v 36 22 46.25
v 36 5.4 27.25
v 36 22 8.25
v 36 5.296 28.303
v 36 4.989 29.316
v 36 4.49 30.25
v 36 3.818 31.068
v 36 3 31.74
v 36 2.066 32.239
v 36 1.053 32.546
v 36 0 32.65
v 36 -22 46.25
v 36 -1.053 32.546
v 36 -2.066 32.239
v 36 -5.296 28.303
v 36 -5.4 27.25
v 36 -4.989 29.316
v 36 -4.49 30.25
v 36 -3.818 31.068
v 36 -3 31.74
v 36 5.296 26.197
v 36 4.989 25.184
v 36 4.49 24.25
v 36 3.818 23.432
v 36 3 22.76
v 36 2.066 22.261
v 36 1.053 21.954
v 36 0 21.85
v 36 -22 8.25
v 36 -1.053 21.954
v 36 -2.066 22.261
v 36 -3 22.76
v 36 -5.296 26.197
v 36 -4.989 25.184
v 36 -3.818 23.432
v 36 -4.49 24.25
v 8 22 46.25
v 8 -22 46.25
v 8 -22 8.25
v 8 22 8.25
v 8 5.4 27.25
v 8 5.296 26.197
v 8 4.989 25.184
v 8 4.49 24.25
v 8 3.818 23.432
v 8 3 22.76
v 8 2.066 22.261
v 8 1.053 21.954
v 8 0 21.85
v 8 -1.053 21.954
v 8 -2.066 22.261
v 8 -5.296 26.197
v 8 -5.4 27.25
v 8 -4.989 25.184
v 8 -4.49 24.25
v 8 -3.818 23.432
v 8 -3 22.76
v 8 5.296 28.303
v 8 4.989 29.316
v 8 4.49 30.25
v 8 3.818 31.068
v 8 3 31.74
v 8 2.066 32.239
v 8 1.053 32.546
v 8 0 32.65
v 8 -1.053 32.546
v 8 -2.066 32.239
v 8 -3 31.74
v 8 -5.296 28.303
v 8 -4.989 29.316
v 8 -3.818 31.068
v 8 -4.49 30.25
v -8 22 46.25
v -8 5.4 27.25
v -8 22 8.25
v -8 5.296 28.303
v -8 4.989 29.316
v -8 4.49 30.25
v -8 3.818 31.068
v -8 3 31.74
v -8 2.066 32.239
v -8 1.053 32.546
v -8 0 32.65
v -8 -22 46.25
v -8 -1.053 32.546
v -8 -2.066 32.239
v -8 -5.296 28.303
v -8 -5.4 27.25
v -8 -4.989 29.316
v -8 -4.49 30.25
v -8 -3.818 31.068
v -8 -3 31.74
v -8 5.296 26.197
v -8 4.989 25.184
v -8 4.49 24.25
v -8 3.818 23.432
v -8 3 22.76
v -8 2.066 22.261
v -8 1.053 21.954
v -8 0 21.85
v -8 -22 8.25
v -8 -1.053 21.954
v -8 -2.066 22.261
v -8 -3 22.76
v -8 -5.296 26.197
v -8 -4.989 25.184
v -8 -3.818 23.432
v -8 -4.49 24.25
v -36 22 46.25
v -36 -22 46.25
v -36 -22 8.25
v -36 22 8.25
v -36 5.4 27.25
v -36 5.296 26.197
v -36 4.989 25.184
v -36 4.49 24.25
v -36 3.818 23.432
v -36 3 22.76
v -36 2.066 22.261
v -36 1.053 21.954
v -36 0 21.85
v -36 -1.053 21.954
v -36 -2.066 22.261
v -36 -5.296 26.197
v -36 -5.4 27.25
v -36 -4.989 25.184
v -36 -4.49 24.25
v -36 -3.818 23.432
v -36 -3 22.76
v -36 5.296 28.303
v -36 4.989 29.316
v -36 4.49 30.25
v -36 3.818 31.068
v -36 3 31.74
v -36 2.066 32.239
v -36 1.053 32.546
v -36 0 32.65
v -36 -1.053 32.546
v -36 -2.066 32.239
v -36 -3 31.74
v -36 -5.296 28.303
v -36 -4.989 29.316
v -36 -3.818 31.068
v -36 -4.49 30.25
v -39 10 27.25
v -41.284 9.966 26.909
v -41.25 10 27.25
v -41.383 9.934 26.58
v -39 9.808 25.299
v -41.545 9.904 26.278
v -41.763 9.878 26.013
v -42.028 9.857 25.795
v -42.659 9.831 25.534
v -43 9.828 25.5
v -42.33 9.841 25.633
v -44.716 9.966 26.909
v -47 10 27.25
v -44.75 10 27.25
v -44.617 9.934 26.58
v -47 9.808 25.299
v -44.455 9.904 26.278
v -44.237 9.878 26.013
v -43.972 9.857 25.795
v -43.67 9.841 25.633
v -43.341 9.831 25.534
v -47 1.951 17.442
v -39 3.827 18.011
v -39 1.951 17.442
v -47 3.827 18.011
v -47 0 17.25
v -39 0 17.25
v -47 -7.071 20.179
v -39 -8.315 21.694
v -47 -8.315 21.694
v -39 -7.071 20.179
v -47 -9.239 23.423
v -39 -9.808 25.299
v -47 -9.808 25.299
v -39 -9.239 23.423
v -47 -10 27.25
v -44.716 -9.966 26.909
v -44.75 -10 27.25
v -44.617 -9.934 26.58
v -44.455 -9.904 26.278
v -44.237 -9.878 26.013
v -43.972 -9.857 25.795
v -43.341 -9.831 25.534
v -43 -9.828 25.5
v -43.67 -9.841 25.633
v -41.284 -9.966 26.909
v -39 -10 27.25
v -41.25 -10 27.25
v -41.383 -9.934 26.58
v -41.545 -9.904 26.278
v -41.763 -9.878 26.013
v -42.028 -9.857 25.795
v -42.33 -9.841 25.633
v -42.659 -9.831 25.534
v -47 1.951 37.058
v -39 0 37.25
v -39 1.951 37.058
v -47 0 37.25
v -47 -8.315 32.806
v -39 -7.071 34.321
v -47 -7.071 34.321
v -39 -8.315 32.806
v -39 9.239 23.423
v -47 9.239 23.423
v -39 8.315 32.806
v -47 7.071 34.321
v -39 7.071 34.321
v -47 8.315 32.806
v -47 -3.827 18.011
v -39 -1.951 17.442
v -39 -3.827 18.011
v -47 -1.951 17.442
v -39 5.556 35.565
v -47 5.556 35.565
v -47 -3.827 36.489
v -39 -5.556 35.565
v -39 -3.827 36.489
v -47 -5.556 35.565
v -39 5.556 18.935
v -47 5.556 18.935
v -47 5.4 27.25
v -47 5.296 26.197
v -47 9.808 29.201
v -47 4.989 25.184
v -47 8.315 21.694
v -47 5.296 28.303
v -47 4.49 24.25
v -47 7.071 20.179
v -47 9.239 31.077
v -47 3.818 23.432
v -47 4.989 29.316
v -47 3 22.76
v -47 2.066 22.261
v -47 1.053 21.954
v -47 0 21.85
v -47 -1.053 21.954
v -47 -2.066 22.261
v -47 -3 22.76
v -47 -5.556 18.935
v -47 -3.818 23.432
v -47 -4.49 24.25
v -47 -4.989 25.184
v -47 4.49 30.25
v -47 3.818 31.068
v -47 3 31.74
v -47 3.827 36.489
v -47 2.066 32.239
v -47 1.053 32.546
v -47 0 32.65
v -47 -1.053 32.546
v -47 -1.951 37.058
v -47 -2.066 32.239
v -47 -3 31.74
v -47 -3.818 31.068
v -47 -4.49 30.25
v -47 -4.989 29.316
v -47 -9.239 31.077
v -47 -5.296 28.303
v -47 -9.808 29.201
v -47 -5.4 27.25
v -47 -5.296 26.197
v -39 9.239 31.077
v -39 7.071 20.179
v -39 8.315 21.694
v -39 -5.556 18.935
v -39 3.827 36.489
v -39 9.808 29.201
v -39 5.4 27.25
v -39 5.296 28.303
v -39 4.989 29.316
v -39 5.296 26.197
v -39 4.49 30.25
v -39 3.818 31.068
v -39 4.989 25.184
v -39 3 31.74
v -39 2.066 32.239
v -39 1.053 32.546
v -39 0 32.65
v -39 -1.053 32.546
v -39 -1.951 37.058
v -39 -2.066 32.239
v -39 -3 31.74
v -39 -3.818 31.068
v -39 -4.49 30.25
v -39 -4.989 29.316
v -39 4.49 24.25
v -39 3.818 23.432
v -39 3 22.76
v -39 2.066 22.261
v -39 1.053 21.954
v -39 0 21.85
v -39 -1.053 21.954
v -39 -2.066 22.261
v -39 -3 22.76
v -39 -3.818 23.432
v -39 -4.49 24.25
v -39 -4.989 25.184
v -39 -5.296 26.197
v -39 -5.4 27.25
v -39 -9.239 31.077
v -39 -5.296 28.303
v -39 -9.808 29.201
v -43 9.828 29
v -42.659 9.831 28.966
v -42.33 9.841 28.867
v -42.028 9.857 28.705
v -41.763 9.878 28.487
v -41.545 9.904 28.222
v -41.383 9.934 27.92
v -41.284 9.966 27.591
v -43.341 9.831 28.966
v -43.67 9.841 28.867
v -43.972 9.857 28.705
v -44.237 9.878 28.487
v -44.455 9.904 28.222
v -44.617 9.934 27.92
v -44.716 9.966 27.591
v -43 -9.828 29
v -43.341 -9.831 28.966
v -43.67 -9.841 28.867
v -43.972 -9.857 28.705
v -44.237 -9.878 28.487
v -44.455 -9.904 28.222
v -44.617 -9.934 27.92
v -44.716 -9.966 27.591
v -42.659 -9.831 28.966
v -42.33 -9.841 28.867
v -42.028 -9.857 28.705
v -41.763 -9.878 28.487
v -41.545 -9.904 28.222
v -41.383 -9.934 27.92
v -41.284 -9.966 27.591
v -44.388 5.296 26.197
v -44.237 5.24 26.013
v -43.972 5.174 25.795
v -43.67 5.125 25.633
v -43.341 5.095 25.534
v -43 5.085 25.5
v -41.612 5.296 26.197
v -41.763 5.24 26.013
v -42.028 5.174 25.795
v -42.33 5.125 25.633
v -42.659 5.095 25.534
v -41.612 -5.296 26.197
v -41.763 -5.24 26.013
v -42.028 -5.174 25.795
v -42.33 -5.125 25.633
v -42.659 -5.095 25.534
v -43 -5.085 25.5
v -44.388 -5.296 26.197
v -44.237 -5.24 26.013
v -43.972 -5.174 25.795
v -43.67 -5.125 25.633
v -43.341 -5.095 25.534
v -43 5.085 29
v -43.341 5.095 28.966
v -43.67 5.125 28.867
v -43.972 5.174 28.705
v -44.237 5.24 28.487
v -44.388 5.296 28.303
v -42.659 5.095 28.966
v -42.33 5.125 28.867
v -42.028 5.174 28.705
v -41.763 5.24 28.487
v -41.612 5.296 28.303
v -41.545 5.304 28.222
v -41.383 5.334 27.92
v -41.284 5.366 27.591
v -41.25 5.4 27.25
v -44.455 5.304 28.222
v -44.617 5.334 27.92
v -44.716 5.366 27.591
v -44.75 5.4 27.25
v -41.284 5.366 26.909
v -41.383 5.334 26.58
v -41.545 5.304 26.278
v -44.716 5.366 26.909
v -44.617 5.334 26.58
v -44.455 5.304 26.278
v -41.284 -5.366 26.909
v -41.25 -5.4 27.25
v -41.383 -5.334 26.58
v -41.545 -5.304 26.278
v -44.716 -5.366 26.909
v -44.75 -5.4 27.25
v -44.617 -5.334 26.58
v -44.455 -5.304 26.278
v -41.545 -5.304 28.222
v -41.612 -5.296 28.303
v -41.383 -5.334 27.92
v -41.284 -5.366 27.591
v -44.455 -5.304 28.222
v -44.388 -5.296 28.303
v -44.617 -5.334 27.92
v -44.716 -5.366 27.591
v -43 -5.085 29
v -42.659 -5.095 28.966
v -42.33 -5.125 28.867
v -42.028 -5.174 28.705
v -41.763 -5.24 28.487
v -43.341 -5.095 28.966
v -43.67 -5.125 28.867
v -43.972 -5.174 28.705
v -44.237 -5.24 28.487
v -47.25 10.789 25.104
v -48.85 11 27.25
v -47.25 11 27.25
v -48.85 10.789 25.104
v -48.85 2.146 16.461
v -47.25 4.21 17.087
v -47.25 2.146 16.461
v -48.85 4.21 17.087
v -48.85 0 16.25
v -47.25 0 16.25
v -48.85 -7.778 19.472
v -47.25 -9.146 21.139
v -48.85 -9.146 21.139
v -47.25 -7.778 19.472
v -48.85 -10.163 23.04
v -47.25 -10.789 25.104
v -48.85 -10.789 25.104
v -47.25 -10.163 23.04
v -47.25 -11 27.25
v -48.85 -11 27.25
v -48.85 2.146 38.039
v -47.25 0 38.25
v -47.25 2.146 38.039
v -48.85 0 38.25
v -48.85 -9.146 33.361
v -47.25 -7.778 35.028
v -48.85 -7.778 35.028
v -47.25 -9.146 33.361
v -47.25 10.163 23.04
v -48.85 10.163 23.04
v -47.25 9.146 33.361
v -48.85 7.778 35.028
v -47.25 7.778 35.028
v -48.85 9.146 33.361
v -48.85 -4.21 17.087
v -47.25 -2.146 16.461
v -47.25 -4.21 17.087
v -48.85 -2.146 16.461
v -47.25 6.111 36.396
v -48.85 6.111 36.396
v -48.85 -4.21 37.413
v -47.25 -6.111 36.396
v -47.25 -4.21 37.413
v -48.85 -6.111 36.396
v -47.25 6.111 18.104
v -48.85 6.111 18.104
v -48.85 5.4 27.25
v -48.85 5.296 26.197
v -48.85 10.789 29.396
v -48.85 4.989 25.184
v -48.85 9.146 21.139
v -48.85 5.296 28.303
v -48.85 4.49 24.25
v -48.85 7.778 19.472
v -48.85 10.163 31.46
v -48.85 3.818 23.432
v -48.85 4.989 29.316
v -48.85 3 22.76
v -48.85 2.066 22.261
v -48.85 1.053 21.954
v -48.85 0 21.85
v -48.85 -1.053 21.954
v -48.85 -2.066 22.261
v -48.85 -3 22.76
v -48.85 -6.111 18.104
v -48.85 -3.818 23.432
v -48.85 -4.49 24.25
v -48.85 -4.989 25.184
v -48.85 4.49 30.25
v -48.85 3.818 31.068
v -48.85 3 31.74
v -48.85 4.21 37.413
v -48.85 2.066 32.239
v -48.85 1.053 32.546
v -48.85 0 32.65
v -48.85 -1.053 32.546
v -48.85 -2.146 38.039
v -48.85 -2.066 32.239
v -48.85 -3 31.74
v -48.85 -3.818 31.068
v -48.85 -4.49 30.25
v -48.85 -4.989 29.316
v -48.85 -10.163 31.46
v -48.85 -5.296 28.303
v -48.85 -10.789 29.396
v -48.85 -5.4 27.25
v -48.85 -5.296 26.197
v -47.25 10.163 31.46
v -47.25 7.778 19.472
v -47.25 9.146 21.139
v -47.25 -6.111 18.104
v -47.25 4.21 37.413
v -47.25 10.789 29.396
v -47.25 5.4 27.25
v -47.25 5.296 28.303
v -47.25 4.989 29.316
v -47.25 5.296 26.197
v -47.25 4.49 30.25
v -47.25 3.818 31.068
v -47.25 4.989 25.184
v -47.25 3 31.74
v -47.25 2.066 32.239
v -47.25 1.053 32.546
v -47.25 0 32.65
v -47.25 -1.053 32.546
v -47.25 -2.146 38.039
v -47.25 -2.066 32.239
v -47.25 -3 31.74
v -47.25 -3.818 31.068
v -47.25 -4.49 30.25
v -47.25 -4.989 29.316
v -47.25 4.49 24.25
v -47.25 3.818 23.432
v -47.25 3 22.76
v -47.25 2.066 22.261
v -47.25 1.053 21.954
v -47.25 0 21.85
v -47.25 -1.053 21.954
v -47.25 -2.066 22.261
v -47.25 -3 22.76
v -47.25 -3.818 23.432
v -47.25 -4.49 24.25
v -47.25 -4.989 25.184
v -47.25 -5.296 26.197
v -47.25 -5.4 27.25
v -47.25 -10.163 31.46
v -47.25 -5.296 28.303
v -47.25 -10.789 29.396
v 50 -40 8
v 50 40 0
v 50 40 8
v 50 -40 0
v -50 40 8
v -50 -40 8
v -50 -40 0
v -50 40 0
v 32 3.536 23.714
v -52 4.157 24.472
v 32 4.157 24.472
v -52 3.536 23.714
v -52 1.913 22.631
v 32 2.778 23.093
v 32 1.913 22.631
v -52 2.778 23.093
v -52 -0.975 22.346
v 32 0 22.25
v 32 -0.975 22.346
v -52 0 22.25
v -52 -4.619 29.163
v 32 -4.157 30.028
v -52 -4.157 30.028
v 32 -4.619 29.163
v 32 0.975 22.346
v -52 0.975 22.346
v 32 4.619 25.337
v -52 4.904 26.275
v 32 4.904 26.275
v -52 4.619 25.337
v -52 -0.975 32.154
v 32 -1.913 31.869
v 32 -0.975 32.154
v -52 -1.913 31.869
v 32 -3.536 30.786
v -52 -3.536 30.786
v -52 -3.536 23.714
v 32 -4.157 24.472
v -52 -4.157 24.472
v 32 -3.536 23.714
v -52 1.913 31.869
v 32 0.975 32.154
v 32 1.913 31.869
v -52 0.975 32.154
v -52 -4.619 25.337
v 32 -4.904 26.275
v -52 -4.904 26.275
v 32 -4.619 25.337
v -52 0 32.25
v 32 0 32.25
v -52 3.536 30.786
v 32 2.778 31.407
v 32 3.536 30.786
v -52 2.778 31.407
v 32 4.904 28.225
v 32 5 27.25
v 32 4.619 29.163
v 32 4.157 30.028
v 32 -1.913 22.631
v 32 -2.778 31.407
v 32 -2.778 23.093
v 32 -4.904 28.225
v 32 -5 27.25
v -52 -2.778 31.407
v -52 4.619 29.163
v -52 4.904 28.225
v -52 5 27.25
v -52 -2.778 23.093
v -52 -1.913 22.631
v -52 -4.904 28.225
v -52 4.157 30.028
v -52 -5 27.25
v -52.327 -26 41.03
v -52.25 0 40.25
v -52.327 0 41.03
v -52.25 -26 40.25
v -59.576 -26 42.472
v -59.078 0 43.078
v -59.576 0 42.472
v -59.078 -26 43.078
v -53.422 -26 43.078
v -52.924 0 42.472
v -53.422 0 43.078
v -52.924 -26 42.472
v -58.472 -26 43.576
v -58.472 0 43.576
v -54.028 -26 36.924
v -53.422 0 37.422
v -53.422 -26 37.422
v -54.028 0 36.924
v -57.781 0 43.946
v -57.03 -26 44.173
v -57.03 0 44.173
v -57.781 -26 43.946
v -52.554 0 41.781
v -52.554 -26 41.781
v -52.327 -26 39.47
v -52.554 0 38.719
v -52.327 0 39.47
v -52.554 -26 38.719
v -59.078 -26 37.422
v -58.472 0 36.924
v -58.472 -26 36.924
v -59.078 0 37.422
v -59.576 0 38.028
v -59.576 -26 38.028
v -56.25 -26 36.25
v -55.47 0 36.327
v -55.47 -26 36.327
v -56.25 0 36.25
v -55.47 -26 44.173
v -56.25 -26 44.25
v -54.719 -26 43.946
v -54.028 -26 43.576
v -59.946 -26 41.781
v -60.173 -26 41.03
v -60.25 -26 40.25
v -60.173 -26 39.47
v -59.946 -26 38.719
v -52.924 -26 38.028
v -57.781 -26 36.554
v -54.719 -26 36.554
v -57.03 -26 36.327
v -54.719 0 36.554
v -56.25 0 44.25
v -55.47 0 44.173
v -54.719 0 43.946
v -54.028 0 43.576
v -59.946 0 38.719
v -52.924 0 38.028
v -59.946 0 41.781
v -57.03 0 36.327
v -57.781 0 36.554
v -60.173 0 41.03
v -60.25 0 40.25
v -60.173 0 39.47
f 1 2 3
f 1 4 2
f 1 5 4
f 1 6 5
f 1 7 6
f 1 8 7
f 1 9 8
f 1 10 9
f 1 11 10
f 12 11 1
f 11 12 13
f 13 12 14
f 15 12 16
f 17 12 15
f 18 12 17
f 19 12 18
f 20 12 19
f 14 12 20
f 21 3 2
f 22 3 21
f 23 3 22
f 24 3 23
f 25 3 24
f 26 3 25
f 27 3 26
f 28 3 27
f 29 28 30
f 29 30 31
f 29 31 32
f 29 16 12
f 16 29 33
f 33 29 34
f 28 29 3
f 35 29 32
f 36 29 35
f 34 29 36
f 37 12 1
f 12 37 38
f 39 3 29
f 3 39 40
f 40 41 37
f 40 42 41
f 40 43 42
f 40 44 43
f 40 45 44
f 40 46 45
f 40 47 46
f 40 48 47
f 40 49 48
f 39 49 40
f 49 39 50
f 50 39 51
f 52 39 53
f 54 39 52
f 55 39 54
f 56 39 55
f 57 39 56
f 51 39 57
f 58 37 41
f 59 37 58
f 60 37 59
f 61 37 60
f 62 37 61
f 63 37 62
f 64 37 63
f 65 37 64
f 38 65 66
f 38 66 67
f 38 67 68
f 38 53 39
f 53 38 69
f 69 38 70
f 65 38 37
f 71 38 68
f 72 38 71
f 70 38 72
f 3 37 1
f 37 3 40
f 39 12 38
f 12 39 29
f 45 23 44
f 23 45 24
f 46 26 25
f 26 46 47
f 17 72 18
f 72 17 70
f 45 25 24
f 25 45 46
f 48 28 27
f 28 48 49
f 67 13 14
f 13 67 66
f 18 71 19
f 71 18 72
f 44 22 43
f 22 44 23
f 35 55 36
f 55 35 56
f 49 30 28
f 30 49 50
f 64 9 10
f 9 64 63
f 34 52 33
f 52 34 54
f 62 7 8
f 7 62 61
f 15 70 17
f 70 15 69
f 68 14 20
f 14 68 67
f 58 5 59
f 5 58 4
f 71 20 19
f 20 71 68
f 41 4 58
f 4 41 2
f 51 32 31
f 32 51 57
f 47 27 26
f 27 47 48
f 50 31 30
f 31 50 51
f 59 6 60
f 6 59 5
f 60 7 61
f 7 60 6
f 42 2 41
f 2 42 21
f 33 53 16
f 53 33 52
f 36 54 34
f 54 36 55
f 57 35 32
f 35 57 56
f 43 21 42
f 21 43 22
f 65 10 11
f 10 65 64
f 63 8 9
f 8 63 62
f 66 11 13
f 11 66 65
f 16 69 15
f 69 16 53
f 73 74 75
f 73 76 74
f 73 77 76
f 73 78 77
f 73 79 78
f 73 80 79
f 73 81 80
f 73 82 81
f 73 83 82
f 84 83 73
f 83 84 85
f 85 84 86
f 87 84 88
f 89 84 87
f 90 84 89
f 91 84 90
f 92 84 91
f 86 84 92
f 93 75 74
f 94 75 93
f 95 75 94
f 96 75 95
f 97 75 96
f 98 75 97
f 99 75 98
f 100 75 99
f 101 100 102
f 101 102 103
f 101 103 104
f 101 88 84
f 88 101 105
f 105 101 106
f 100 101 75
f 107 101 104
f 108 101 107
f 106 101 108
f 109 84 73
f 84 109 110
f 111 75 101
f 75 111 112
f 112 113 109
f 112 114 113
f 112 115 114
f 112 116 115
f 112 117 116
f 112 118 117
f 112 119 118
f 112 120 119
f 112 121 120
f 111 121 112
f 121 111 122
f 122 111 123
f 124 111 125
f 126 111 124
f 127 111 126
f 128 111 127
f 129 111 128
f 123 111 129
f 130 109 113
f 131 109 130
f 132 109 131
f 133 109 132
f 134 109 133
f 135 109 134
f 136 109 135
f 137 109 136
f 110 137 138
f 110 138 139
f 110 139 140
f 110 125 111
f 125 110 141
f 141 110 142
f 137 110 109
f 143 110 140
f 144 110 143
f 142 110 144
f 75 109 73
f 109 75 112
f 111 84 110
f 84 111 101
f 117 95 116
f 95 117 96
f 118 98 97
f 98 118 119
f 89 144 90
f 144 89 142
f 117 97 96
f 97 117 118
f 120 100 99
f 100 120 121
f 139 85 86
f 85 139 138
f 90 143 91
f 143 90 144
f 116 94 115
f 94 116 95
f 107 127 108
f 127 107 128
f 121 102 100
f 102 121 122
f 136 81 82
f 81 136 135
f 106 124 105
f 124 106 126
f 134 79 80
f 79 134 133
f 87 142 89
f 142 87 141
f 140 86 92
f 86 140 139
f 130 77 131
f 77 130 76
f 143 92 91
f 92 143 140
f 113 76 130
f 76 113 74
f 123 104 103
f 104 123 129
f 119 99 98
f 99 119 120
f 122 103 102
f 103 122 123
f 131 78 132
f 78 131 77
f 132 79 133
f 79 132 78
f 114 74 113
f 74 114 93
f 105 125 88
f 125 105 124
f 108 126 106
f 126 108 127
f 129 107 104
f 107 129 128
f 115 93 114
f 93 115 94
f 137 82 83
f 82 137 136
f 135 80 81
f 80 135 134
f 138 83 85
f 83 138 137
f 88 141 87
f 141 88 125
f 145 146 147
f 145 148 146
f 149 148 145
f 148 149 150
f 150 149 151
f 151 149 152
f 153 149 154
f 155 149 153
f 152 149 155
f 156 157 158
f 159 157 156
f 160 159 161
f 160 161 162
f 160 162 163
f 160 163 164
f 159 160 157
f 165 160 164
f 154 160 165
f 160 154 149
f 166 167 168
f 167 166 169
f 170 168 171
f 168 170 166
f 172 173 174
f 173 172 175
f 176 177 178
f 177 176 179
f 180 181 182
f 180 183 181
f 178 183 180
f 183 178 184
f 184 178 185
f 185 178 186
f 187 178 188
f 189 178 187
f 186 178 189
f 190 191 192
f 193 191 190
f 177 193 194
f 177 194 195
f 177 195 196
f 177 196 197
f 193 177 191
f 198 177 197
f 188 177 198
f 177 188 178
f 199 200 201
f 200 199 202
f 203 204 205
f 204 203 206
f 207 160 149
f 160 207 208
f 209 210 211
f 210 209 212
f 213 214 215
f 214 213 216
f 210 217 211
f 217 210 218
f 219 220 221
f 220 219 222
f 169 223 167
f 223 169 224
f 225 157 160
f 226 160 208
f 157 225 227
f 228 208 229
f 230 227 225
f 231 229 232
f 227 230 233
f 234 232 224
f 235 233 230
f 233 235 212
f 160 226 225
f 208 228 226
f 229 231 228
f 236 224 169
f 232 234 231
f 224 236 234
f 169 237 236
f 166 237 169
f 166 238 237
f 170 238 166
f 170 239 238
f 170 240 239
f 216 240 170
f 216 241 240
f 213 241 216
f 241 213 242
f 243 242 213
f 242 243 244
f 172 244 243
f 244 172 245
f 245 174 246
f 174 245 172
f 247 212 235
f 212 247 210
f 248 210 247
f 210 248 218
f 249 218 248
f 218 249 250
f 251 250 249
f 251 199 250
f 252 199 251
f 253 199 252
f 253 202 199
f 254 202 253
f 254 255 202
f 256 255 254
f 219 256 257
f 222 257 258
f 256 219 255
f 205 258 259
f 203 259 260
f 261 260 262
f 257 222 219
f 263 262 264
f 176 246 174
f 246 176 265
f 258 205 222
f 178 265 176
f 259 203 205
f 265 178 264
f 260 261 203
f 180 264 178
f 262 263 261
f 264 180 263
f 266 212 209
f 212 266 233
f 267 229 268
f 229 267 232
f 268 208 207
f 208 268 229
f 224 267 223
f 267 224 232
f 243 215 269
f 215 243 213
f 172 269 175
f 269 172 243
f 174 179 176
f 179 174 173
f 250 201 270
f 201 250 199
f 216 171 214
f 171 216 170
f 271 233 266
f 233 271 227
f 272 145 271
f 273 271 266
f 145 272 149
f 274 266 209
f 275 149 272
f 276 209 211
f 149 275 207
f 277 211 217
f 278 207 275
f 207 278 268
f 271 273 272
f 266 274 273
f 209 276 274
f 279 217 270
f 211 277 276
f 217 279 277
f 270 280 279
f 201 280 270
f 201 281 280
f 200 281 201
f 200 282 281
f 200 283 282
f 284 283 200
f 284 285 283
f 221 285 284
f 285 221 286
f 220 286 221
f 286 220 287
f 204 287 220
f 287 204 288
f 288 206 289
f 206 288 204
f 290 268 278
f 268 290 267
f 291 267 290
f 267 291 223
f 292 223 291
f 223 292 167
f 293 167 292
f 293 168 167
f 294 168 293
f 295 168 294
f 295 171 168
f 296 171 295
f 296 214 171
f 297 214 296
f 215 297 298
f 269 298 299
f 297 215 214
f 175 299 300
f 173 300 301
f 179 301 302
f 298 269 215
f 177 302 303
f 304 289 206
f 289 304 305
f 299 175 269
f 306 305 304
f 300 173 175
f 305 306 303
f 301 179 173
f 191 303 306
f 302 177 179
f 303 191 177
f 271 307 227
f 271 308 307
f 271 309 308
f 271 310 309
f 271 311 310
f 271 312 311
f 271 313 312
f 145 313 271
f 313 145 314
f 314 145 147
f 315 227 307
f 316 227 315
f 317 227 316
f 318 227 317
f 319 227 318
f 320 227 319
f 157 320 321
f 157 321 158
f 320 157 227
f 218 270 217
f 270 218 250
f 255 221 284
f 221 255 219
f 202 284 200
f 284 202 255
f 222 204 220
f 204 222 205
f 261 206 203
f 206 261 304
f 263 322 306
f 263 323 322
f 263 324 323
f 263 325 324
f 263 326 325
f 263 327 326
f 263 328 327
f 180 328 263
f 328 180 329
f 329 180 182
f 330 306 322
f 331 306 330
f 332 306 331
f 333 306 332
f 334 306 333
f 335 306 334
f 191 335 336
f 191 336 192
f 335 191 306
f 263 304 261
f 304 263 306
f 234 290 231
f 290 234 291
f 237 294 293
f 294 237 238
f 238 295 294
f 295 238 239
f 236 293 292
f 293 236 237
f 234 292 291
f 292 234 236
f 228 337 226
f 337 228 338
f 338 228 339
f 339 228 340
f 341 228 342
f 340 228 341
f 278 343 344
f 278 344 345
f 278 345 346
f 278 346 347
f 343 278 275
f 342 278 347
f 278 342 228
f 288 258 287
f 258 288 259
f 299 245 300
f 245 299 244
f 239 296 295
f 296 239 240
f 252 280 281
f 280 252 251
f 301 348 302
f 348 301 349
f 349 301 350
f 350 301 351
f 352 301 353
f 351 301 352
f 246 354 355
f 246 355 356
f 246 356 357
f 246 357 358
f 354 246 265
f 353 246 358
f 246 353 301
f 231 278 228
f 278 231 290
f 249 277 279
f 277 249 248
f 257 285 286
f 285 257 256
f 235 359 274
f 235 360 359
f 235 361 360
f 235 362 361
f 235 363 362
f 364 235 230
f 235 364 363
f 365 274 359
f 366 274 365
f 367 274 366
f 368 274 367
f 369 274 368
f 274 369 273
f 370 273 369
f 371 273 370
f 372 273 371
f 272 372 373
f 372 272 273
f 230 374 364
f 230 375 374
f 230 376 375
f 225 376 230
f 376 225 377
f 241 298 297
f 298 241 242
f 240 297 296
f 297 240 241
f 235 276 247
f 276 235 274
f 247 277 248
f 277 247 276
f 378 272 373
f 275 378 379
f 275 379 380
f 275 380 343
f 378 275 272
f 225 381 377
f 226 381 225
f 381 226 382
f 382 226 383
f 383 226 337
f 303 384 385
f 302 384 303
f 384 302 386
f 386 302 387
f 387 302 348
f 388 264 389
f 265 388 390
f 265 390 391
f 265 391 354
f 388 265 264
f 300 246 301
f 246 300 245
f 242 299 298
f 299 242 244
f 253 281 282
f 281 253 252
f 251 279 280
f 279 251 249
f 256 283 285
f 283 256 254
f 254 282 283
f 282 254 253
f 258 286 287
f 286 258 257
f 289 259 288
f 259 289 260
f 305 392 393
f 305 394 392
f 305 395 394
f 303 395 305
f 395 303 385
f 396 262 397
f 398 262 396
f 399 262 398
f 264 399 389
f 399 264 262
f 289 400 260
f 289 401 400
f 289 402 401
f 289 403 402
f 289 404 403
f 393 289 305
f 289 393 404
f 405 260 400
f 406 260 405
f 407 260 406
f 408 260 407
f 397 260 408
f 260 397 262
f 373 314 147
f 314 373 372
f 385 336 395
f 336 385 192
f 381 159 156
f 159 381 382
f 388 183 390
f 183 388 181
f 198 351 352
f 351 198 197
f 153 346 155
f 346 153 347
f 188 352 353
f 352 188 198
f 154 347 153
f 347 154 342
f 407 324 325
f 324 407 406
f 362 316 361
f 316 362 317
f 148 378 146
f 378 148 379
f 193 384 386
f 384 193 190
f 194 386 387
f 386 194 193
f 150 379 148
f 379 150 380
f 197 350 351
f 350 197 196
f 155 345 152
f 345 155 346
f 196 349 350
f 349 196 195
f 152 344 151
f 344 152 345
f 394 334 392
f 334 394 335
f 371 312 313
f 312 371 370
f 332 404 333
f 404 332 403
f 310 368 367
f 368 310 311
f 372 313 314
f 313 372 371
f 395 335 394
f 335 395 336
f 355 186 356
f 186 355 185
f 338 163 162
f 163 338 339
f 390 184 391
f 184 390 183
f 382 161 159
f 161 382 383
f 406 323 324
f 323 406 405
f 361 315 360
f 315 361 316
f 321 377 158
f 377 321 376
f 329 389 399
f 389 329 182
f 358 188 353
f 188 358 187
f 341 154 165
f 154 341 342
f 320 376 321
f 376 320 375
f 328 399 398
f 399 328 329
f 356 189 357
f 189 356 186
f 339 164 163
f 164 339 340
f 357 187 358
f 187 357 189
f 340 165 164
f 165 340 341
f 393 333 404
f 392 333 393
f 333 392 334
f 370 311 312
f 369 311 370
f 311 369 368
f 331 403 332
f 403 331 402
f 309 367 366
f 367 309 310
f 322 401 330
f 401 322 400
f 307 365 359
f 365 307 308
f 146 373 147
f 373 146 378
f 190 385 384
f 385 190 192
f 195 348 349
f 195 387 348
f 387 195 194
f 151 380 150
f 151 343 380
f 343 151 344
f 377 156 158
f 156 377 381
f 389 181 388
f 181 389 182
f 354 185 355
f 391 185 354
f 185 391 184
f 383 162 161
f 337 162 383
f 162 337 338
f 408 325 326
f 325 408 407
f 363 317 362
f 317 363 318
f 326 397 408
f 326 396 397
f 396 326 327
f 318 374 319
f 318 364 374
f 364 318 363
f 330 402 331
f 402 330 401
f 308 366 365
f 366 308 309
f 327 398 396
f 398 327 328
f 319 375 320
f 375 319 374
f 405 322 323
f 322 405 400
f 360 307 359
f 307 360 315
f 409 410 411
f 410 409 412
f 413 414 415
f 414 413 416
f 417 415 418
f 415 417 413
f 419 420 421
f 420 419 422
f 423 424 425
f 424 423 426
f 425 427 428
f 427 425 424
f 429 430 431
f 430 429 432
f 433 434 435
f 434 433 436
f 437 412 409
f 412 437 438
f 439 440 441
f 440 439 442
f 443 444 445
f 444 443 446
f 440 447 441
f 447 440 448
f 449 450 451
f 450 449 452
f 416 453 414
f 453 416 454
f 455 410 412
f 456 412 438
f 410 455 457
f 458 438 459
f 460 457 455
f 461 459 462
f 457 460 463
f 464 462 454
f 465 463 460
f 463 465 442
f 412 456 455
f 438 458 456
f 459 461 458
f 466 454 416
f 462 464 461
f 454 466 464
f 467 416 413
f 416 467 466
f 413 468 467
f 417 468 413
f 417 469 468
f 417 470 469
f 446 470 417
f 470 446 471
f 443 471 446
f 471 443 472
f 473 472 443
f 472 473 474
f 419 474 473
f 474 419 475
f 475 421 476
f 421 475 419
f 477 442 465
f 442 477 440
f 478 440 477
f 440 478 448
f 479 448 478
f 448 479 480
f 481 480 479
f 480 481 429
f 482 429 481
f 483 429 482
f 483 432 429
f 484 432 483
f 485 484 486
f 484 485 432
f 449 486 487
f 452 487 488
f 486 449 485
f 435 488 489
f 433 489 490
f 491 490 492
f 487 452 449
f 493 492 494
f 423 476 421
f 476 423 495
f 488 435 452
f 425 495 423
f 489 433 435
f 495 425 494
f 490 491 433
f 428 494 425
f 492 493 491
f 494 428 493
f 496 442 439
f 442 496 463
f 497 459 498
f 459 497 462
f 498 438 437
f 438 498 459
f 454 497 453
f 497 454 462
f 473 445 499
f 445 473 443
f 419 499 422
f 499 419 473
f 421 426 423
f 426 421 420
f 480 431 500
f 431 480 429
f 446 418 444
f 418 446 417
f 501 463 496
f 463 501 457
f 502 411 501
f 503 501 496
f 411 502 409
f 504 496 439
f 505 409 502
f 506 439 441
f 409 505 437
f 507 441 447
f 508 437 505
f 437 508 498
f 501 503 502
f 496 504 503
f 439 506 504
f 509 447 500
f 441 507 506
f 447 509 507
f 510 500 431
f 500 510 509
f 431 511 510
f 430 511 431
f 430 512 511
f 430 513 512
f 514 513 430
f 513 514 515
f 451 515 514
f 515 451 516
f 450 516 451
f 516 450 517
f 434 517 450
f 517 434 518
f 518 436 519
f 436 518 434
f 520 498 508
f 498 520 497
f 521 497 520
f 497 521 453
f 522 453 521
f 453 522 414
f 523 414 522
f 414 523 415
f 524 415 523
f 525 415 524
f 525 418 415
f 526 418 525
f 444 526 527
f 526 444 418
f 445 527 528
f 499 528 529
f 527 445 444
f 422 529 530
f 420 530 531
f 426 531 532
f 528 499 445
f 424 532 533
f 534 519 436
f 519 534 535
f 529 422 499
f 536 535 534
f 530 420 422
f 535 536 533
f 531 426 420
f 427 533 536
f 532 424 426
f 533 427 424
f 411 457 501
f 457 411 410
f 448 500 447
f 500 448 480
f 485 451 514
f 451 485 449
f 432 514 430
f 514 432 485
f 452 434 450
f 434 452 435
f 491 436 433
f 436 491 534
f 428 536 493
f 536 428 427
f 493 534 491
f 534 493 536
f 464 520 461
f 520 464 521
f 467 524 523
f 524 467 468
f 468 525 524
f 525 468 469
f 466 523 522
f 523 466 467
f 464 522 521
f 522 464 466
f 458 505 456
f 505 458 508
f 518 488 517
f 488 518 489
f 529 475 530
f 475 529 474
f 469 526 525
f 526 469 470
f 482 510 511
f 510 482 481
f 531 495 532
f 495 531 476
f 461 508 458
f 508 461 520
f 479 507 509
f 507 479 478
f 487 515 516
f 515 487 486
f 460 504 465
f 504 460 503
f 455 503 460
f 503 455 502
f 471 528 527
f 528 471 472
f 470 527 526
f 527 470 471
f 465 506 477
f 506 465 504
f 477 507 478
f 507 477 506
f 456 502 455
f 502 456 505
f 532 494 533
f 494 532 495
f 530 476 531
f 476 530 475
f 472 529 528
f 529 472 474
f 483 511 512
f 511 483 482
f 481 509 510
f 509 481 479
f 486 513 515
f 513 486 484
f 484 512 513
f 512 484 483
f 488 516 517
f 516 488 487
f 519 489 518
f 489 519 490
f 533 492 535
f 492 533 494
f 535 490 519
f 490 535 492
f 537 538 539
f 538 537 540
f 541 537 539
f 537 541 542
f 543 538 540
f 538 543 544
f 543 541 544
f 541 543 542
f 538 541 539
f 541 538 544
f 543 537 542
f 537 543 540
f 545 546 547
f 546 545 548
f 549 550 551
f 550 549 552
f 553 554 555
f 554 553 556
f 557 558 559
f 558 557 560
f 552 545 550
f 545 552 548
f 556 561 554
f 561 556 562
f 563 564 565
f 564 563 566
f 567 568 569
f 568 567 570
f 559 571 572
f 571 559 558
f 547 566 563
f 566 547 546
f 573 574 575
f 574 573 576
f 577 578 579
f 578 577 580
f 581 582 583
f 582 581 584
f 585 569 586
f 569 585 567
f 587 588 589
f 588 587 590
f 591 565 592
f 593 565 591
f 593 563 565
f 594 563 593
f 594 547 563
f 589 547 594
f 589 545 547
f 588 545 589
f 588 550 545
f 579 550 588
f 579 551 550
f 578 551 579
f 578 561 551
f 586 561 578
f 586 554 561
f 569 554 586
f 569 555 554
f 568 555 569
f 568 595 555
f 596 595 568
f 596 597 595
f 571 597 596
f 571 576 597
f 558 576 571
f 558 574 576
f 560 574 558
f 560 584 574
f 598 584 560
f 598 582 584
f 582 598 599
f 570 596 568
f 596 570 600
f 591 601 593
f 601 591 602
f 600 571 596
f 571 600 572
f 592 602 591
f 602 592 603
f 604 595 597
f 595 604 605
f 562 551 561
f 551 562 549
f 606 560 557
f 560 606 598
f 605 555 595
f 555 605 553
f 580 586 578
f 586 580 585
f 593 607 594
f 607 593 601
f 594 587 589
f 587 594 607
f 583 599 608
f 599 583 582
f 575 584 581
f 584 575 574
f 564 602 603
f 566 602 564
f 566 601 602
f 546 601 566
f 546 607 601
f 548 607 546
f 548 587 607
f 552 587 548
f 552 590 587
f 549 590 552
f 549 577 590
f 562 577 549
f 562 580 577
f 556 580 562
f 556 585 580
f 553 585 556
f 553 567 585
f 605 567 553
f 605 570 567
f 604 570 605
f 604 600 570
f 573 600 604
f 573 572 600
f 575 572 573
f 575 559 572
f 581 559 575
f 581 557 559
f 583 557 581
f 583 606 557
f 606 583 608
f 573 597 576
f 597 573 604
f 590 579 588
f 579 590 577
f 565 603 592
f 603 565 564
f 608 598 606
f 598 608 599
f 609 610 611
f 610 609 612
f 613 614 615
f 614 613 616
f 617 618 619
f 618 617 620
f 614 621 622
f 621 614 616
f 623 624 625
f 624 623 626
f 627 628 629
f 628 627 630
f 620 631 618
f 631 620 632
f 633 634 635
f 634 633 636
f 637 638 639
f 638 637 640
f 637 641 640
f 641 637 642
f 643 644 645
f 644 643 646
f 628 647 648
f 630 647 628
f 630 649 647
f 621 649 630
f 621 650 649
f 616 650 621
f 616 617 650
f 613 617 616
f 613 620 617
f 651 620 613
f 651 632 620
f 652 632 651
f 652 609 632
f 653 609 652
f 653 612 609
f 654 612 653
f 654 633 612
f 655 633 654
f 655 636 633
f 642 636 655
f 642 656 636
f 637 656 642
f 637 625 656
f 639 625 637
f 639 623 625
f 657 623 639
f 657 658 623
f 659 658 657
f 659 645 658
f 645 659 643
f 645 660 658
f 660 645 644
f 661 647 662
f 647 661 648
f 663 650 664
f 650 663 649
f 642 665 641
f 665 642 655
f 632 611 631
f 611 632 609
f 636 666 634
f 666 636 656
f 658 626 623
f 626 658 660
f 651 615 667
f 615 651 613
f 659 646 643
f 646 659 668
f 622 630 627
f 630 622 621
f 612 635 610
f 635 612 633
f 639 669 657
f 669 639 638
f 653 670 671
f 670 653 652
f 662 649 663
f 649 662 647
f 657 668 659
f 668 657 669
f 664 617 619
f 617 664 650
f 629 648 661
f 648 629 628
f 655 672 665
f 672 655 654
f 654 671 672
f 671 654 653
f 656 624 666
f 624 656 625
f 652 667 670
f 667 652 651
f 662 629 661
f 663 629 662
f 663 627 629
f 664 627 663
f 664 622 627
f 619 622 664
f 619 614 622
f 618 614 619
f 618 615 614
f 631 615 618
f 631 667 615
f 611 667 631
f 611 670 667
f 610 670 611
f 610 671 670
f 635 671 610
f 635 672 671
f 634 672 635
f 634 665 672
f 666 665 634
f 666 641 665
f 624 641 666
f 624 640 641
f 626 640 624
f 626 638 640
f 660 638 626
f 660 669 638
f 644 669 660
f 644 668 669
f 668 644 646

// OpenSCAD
$fn = 32;

// ------------------------------------------------------------------------
// Machine vise: screw d10, jaws 28 x 38 mm
// Every part is its own module, assembly() places every instance.
// ------------------------------------------------------------------------

// --- part 1 ---
module vise_bed() {
  difference() {
    translate([-50, -40, 0]) cube([100, 80, 8]);
  }
}

// --- part 2 ---
module vise_jaw() {
  difference() {
    translate([-14, -22, 0]) cube([28, 44, 38]);
    translate([0, 0, 19]) rotate([0, 90, 0]) cylinder(h = 30, d = 10.8, center = true);
  }
}

// --- part 3 ---
module vise_screw() {
  translate([0, 0, -42]) cylinder(h = 84, d = 10);
}

// --- part 4 ---
module screw_collar() {
  difference() {
    cylinder(h = 8, d = 20);
    translate([0, 0, -1]) cylinder(h = 10, d = 10.8);
    translate([0, 0, 4]) rotate([90, 0, 0]) cylinder(h = 22, d = 3.5, center = true);
  }
}

// --- part 5 ---
module screw_washer() {
  difference() {
      translate([0, 0, 0]) cylinder(h = 1.6, d = 22);
      translate([0, 0, -1]) cylinder(h = 3.6, d = 10.8);
    }
}

// --- part 6 ---
module vise_handle() {
  cylinder(h = 26, d = 8);
}

// --- assembly ---
module assembly() {
  color([0.80, 0.24, 0.20]) translate([0, 0, 0]) rotate([0, 0, 0]) vise_bed();
  color([0.20, 0.45, 0.75]) translate([22, 0, 8.25]) rotate([0, 0, 0]) vise_jaw();
  color([0.25, 0.62, 0.32]) translate([-22, 0, 8.25]) rotate([0, 0, 0]) vise_jaw();
  color([0.92, 0.70, 0.18]) translate([-10, 0, 27.25]) rotate([0, 90, 0]) vise_screw();
  color([0.58, 0.35, 0.70]) translate([-47, 0, 27.25]) rotate([0, 90, 0]) screw_collar();
  color([0.16, 0.66, 0.66]) translate([-48.85, 0, 27.25]) rotate([0, 90, 0]) screw_washer();
  color([0.85, 0.48, 0.18]) translate([-56.25, 0, 40.25]) rotate([90, 0, 0]) vise_handle();
}

assembly();
